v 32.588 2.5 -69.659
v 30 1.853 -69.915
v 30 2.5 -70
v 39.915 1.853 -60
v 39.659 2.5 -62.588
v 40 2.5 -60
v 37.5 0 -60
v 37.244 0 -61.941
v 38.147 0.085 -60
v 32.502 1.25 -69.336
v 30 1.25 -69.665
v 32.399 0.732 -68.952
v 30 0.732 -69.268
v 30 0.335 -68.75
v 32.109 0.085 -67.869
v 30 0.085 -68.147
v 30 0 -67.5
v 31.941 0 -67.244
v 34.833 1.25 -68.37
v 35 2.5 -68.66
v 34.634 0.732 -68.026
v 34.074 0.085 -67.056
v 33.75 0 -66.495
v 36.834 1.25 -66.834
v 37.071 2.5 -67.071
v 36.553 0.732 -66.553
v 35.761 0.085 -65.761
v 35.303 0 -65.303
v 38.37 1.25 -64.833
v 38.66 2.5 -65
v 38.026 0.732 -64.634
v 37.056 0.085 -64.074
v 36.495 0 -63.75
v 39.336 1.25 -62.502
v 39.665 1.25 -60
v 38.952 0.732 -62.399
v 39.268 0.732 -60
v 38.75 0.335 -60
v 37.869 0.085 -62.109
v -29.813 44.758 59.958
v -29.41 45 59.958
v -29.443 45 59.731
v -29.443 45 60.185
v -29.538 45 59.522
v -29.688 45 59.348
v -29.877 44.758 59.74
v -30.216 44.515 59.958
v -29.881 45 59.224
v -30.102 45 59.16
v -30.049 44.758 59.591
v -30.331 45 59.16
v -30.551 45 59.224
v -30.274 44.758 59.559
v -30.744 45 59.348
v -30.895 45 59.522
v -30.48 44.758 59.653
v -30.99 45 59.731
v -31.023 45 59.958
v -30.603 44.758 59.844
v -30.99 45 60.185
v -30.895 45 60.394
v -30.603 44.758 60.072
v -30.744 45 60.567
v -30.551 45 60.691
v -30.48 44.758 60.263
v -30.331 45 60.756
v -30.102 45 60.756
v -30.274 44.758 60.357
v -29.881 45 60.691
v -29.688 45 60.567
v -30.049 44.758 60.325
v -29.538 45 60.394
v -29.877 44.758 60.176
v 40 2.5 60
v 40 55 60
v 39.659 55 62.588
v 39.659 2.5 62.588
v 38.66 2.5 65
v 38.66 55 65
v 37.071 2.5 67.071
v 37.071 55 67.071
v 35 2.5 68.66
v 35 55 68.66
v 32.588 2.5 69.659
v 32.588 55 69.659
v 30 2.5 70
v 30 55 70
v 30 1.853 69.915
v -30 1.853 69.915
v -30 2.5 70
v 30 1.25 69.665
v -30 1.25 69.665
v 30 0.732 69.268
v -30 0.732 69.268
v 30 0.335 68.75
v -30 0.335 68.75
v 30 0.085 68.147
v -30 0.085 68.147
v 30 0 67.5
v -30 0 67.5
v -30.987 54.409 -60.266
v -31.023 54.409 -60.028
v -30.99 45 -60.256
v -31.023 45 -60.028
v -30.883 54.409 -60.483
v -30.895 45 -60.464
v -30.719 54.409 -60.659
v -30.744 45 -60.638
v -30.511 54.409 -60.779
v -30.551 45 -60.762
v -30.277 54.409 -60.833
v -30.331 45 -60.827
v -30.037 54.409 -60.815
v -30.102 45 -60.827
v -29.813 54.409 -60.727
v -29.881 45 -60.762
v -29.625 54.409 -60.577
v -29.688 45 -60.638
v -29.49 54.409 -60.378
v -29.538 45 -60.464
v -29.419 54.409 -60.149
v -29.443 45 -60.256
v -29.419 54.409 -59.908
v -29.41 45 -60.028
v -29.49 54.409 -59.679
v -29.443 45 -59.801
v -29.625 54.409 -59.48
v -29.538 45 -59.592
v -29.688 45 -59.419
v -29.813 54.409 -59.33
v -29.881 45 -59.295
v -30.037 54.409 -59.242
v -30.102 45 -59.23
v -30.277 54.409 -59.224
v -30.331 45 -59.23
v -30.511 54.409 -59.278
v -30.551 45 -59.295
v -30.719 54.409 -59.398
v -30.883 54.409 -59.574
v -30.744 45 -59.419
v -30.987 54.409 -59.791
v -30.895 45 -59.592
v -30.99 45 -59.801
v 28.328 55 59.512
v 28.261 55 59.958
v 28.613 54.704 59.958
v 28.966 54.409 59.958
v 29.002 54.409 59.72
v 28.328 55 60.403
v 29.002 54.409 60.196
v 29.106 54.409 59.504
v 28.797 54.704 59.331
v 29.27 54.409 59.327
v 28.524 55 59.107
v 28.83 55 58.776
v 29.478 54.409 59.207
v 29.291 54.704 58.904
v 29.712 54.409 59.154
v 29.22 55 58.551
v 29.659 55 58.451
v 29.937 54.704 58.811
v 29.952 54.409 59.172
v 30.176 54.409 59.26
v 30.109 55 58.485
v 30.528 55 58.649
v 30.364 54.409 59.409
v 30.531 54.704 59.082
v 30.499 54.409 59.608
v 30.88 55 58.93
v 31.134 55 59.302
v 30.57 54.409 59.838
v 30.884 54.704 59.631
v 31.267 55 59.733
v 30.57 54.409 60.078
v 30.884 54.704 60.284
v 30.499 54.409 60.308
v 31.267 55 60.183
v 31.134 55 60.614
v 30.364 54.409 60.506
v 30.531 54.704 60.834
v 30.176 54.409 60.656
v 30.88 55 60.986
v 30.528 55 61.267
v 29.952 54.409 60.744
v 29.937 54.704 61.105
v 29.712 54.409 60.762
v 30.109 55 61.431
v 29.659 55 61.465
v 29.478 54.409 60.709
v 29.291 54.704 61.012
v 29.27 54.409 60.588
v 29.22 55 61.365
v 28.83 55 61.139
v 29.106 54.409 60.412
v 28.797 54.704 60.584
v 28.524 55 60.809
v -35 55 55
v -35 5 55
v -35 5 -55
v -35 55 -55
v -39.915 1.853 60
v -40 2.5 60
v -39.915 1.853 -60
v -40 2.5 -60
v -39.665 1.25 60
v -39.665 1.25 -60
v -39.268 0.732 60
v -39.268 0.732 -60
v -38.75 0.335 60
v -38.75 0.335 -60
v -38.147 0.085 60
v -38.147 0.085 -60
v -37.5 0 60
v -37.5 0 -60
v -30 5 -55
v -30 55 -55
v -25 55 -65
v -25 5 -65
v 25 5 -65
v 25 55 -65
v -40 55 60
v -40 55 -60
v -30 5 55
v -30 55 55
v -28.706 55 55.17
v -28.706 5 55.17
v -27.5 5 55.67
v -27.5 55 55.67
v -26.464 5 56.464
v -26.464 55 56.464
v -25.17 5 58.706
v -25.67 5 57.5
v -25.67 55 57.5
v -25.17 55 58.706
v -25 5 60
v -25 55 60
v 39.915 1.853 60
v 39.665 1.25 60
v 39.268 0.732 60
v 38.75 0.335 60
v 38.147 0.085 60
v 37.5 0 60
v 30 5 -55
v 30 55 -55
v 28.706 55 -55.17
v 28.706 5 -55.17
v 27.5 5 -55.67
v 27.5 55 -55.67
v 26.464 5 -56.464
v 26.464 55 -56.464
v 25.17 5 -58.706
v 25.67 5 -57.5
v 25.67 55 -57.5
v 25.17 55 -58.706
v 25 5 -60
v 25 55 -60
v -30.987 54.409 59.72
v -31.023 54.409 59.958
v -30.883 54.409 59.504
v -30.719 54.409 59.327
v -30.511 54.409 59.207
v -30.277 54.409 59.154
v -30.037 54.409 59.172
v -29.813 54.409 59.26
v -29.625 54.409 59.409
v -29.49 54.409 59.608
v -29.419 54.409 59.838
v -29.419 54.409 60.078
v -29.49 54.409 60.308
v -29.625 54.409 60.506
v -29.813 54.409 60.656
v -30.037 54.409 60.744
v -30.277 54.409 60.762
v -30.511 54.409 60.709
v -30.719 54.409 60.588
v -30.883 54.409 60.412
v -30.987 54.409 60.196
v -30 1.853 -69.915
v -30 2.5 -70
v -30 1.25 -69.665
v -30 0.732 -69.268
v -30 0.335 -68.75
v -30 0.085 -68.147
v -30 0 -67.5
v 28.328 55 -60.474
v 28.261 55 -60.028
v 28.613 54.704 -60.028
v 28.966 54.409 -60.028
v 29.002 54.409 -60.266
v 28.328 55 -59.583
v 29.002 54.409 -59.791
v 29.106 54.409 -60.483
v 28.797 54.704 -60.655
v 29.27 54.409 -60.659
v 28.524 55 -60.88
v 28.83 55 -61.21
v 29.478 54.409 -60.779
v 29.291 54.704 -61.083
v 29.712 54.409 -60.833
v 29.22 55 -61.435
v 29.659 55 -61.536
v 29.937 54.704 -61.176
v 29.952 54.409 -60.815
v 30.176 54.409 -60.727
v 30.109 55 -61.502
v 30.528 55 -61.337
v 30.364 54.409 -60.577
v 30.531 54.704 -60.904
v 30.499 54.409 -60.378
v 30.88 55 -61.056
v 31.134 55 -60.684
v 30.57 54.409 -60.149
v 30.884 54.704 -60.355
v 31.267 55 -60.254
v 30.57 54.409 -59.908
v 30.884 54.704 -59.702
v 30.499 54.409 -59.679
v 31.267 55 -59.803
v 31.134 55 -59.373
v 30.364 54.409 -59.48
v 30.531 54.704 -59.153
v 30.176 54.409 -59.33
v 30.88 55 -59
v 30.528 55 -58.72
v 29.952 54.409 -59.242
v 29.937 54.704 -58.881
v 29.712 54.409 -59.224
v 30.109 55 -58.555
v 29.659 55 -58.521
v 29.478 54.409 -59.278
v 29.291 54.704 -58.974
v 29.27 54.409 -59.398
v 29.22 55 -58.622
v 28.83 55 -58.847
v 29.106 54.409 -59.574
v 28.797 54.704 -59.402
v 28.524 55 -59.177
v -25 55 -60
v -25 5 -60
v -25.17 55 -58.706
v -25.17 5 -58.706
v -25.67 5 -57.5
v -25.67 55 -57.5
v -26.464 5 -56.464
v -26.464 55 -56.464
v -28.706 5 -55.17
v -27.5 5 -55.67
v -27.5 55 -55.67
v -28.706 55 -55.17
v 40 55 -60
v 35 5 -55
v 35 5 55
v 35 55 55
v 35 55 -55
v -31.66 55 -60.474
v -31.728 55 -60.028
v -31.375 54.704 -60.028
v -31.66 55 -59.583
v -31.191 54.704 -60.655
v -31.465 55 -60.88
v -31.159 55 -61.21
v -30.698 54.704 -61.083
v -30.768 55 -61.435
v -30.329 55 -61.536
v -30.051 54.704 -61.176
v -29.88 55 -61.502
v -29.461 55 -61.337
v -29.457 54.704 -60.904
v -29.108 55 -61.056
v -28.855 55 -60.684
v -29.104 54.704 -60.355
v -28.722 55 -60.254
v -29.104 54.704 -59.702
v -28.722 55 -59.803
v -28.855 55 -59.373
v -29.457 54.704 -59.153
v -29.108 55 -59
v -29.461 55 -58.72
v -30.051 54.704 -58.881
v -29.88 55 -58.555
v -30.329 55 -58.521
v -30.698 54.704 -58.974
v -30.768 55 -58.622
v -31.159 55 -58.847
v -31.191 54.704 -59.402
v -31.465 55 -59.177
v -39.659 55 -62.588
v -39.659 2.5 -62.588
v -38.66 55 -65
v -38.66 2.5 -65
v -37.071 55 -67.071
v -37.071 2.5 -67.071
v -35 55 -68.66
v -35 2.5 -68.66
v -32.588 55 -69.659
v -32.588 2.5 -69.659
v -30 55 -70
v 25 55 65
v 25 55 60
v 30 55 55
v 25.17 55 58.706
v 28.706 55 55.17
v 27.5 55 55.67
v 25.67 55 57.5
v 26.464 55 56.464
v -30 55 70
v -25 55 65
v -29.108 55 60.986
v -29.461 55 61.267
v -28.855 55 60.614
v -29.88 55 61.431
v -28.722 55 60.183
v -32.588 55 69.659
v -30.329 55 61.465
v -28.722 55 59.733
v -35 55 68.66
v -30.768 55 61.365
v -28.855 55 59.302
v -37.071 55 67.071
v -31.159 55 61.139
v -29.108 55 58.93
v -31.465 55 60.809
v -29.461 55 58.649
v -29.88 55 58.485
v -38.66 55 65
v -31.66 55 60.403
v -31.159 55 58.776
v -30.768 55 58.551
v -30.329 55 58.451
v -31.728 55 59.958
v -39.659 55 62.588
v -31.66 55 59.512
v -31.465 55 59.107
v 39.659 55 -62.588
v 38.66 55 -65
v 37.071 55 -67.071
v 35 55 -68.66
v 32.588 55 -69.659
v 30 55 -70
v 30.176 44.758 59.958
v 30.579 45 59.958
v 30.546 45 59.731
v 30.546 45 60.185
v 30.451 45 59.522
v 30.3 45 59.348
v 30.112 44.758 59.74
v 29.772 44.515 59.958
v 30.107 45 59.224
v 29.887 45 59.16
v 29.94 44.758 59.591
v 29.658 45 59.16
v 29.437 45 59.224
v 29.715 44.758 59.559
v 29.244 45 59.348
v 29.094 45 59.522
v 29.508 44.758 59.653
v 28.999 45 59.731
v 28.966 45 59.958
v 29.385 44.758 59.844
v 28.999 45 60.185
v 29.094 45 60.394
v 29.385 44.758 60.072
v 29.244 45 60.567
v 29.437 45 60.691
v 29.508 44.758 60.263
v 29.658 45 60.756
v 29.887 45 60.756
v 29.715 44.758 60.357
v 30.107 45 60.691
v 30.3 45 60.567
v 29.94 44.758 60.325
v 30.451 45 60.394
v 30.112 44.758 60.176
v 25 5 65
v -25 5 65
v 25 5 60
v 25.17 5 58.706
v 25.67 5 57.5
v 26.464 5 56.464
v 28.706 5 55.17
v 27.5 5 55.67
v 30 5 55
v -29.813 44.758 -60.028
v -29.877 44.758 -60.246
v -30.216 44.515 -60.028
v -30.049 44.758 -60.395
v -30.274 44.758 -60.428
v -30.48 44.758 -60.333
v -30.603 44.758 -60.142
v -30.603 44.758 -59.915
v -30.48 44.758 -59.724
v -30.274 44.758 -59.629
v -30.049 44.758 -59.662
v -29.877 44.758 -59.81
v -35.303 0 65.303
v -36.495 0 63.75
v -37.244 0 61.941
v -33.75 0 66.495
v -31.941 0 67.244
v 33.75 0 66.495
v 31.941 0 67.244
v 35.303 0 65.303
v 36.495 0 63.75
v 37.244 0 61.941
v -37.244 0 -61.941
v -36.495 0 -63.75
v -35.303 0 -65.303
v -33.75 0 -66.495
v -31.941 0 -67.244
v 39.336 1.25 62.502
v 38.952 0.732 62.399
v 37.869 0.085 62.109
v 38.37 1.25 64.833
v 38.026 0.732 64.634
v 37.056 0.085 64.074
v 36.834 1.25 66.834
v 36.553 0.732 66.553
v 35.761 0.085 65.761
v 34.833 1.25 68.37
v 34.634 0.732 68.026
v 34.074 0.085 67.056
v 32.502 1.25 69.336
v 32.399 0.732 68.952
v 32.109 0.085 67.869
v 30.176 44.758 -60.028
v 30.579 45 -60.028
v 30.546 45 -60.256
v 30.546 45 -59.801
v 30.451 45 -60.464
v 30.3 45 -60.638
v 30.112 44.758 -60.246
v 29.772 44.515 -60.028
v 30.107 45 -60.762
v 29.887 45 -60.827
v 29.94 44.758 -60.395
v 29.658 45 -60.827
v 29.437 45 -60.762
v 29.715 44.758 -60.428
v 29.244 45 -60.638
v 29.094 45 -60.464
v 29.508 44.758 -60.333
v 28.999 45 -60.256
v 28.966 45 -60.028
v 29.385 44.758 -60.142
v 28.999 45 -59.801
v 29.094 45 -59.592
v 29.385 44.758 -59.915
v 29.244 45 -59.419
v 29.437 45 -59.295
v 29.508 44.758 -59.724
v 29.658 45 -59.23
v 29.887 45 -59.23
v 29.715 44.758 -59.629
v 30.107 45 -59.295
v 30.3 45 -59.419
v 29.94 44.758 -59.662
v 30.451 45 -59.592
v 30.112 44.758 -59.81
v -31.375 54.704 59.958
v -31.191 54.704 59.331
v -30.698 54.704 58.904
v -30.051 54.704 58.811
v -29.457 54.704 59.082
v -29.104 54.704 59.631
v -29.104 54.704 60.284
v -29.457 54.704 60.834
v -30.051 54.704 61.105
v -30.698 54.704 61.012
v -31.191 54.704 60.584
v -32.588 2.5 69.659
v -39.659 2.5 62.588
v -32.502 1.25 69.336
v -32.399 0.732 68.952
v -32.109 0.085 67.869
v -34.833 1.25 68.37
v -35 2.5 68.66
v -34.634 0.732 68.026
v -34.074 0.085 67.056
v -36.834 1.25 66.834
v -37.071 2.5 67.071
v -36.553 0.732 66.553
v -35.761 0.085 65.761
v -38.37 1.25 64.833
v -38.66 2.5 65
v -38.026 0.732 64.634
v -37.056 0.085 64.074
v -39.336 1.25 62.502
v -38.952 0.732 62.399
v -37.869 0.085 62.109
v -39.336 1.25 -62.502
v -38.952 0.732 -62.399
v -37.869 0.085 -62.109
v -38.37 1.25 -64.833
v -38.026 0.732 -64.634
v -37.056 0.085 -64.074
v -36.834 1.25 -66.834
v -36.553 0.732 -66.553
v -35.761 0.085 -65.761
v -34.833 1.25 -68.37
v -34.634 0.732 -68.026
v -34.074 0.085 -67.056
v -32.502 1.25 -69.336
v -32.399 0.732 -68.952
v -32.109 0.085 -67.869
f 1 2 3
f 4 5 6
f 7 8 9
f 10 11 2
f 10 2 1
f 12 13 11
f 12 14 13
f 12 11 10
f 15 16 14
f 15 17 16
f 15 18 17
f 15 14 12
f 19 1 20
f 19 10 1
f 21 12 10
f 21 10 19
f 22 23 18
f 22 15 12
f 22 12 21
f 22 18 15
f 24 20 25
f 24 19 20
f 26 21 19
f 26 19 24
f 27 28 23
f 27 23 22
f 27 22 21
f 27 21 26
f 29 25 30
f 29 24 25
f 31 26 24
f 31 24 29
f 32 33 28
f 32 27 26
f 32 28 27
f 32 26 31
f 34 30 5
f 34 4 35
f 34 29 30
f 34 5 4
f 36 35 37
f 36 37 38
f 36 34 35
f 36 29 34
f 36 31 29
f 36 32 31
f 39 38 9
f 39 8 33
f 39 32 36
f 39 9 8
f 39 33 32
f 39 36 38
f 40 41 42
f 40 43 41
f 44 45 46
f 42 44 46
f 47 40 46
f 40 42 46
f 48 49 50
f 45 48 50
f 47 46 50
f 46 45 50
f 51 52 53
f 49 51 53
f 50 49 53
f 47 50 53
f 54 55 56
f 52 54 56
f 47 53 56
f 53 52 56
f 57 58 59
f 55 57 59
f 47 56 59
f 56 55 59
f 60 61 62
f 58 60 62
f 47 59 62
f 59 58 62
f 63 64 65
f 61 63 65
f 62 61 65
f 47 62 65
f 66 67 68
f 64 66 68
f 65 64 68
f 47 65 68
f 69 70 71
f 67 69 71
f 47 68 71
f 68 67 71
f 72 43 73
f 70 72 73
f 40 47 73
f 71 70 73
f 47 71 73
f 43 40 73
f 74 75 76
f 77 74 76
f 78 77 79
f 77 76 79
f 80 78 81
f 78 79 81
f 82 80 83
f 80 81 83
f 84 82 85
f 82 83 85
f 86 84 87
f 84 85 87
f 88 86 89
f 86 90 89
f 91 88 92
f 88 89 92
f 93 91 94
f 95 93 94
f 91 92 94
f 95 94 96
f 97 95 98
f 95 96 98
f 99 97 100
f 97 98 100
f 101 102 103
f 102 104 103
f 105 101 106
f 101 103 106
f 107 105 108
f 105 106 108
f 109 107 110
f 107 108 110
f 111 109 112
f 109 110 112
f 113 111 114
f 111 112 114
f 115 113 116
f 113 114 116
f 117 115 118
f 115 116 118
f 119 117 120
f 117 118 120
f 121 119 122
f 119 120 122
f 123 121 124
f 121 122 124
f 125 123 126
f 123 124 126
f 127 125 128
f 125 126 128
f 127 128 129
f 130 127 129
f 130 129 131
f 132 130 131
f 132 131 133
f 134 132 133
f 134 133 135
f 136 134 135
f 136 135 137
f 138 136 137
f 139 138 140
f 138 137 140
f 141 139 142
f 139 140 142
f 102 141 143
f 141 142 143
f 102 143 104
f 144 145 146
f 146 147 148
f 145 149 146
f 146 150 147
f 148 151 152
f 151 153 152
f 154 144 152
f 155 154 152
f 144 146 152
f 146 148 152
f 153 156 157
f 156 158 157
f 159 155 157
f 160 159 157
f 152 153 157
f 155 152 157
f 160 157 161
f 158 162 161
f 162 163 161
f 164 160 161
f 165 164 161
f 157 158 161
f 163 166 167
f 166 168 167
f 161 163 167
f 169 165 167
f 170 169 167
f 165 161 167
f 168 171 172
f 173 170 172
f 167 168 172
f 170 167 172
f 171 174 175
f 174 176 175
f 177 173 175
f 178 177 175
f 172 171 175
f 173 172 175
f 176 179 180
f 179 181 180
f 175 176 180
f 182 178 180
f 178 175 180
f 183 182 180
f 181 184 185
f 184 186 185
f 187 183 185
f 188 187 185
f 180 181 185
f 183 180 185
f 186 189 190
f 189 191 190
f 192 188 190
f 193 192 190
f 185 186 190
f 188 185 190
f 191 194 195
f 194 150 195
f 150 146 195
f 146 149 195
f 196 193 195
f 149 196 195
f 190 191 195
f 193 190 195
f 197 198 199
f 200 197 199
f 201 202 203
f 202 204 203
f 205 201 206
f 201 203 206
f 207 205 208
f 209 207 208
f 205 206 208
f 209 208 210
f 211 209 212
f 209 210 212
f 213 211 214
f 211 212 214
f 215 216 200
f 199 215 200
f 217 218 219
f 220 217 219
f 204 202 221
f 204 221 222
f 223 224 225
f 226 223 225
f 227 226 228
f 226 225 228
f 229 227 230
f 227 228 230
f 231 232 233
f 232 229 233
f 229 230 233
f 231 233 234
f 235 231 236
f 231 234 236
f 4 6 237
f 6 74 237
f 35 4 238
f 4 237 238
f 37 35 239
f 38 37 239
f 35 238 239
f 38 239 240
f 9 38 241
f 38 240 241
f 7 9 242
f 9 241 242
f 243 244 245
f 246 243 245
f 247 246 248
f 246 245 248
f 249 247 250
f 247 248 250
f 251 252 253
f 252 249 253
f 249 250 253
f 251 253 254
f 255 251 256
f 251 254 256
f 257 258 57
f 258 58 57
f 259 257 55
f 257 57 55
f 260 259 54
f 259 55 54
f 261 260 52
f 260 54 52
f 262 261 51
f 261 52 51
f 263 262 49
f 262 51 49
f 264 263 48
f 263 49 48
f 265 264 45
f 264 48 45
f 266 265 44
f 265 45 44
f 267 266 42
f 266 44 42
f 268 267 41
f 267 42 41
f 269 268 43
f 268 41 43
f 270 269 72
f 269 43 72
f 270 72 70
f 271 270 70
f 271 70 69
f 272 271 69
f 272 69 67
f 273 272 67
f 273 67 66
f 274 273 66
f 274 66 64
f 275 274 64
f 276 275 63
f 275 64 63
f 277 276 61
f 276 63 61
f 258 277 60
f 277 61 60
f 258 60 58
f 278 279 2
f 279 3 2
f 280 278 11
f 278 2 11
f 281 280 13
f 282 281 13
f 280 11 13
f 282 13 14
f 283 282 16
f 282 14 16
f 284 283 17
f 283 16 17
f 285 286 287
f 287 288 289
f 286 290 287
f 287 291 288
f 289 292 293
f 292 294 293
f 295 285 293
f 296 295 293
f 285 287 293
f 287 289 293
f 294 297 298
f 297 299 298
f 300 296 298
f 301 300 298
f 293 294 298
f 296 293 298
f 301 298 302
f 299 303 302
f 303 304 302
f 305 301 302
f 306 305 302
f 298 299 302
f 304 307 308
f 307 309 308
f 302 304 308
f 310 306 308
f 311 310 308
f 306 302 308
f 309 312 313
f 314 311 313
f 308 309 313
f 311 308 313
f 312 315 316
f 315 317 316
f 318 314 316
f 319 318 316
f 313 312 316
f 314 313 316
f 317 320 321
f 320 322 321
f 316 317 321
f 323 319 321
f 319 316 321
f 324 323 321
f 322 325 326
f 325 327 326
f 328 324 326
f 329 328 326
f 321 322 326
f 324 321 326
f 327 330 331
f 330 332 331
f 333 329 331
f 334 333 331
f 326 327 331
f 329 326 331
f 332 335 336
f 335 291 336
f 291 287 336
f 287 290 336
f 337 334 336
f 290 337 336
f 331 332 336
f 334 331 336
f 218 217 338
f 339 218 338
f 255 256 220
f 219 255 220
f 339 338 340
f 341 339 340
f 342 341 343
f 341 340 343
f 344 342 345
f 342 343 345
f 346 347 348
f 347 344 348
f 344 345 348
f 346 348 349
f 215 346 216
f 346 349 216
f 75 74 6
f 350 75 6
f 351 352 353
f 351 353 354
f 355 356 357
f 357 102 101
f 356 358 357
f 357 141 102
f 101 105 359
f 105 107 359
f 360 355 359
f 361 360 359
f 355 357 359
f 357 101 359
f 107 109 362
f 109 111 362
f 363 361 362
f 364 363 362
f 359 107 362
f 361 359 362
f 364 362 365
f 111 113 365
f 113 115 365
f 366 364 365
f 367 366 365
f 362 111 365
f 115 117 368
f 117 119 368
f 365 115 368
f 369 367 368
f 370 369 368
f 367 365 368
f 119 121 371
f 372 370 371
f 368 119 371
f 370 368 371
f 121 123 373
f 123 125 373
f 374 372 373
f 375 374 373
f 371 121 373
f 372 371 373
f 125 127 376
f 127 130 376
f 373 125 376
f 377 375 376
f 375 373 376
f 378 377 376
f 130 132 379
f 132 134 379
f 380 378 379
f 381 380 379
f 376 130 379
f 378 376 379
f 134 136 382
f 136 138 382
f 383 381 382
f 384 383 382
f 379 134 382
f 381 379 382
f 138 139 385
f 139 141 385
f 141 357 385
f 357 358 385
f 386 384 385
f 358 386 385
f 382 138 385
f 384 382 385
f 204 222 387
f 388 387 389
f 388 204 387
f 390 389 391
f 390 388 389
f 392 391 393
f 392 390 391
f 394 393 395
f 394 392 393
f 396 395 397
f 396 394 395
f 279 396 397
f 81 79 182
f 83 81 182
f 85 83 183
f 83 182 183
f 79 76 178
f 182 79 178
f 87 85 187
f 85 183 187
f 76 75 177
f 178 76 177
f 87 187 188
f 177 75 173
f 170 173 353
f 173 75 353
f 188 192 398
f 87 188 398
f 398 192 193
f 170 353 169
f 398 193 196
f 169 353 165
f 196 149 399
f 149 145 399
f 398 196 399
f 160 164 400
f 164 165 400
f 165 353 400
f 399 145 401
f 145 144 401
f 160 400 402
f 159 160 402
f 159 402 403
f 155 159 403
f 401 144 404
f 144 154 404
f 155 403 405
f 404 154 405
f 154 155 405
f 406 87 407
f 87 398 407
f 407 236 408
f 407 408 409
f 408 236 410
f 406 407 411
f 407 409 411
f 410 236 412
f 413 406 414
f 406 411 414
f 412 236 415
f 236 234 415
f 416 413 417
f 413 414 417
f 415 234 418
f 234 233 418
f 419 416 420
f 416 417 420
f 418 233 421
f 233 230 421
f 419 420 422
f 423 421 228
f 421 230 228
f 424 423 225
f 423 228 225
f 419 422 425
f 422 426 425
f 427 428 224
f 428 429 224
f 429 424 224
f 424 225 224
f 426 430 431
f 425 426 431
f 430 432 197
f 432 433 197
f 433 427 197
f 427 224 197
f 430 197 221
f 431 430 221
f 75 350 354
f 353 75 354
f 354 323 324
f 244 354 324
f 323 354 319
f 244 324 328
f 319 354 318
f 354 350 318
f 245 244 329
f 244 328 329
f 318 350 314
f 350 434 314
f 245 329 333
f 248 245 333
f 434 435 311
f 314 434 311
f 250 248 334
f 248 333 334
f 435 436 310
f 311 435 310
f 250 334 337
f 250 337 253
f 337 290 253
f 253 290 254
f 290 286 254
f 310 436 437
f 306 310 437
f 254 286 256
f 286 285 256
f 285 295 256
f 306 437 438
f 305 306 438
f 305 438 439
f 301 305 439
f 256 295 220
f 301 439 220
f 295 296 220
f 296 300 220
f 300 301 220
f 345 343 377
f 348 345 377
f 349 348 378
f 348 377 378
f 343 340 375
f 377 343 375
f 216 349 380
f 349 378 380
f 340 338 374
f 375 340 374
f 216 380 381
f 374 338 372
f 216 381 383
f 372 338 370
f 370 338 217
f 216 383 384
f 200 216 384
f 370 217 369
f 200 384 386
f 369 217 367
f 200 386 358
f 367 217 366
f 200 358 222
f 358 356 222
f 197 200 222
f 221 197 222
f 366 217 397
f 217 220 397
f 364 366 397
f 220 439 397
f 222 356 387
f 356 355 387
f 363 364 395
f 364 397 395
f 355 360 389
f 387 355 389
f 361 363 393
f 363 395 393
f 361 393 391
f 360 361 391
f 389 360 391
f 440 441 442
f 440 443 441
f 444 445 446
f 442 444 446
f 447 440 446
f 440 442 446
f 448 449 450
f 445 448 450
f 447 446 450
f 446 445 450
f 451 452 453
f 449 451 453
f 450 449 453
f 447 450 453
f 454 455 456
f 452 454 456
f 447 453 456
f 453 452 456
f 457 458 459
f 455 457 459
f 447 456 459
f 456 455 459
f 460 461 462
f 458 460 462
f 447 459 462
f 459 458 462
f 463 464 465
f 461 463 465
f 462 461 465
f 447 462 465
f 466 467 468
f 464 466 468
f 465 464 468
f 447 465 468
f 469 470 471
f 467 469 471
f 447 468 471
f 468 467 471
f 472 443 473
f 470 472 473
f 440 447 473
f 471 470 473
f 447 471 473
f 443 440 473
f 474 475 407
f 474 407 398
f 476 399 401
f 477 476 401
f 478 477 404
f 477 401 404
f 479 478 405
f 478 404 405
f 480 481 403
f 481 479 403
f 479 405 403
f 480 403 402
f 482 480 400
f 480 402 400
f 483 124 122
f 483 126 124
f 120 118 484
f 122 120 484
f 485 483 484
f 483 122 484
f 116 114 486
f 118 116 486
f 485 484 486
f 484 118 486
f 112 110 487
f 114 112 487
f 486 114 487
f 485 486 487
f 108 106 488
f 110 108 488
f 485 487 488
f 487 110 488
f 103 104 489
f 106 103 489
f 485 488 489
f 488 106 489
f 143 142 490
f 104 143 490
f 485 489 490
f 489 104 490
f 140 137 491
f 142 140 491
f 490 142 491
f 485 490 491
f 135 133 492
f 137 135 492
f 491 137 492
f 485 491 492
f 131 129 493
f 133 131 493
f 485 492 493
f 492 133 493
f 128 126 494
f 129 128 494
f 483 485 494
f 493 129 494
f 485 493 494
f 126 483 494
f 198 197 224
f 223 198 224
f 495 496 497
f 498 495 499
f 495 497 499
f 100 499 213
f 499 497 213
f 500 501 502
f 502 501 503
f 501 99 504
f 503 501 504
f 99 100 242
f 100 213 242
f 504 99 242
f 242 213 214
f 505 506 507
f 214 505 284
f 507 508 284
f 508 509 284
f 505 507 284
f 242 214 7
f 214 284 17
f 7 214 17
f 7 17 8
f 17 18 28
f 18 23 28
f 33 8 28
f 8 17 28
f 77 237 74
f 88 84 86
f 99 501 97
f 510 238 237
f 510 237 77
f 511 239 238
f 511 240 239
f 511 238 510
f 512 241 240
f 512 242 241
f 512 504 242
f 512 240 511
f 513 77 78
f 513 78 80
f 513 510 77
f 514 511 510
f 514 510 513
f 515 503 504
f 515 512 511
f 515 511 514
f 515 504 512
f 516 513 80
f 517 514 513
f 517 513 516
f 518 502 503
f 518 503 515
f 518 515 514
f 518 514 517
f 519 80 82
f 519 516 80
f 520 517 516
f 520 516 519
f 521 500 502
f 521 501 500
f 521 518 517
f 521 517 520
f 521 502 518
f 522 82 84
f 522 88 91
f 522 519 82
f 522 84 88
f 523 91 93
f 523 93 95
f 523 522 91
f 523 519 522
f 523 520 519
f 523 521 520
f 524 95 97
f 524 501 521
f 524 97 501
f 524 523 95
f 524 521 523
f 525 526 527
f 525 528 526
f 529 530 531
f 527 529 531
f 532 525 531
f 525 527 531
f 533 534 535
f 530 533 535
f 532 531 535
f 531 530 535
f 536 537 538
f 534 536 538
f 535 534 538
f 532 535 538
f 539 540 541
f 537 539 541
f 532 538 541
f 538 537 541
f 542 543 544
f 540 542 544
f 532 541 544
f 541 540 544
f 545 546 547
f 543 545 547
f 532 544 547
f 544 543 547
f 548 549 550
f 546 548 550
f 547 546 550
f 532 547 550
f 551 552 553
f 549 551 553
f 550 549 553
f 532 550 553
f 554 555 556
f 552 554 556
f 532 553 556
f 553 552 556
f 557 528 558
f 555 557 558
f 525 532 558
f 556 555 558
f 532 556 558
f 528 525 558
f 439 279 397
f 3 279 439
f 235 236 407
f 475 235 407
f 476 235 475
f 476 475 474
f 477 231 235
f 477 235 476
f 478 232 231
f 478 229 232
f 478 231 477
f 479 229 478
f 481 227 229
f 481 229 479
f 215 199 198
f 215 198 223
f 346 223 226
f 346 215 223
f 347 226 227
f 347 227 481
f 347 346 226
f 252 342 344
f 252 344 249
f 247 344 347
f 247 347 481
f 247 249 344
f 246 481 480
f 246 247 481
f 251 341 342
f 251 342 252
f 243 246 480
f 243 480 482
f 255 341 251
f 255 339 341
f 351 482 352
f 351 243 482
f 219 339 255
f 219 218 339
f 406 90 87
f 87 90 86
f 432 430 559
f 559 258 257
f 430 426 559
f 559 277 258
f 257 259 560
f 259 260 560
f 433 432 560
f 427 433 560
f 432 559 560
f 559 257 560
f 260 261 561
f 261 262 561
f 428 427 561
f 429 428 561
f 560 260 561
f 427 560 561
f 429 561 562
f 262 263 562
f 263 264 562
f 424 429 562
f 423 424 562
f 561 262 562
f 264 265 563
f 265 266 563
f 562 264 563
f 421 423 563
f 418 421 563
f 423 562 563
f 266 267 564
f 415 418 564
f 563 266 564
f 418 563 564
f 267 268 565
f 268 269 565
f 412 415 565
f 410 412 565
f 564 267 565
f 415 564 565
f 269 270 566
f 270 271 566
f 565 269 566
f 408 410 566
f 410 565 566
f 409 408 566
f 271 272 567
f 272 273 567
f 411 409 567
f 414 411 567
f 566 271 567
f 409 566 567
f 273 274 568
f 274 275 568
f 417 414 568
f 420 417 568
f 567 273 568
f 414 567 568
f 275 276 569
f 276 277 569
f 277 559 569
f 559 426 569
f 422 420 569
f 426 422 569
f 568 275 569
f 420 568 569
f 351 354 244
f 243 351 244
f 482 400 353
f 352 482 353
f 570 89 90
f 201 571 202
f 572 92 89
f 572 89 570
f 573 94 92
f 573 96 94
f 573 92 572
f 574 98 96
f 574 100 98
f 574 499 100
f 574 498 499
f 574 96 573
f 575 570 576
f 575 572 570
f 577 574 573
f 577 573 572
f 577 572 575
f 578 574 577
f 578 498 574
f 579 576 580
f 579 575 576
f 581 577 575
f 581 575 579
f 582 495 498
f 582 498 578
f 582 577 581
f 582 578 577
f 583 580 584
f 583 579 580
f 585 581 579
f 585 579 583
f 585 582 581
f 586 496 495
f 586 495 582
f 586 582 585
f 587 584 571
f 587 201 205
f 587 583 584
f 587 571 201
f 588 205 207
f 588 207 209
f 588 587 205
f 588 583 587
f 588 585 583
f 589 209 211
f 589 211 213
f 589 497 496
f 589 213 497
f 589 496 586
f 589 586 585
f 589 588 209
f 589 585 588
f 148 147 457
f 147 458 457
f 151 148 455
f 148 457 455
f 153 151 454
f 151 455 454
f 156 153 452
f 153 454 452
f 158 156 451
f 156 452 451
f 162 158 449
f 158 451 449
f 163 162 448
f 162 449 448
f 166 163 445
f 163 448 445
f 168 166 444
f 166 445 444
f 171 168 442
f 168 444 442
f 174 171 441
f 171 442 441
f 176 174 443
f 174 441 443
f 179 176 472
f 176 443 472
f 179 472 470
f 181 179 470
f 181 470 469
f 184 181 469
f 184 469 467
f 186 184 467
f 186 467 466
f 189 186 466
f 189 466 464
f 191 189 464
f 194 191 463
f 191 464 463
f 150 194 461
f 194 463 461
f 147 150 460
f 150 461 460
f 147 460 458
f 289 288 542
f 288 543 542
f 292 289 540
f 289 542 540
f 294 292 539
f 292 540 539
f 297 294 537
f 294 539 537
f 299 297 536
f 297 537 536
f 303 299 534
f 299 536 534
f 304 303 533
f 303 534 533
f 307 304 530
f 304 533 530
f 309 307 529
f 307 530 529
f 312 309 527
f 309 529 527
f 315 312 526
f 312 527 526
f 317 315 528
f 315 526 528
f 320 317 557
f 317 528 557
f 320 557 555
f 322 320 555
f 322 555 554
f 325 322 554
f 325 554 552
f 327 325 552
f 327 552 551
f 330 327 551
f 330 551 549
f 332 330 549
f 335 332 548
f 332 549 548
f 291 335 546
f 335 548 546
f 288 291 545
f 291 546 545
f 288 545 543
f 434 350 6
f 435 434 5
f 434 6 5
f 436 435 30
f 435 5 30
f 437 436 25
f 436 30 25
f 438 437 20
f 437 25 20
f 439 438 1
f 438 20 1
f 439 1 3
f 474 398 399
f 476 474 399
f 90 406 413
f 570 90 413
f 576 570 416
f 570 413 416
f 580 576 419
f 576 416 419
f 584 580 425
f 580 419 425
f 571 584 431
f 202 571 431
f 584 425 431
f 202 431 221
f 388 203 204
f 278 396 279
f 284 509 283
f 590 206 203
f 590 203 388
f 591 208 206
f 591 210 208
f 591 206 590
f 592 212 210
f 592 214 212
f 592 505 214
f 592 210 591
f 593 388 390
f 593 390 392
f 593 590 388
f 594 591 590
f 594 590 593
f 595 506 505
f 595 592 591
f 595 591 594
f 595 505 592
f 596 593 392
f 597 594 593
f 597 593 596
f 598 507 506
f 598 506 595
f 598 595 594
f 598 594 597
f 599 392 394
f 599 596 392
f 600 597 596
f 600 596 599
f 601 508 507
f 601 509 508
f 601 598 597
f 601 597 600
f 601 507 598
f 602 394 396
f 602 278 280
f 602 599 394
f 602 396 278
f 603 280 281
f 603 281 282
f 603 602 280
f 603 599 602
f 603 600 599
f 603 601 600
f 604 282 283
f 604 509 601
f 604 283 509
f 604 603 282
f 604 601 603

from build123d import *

# Parameters (mm, degrees)
SKETCH2_W                                         = 80
SKETCH2_H                                         = 140
BOSS_EXTRUDE1_DEPTH                               = 50
SHELL1_T                                          = -5
SKETCH3_W                                         = 80
SKETCH3_H                                         = 140
SKETCH3_W_2                                       = 70
SKETCH3_H_2                                       = 130
BOSS_EXTRUDE2_DEPTH                               = 5
BOSS_EXTRUDE3_REACH                               = 99.596
CSK_FOR_0_FLAT_HEAD_MACHINE_SCREW_100_D           = 1.6129
CSK_FOR_0_FLAT_HEAD_MACHINE_SCREW_100_DEPTH       = 10
CSK_FOR_0_FLAT_HEAD_MACHINE_SCREW_100_CSINK_D     = 3.0226
CSK_FOR_0_FLAT_HEAD_MACHINE_SCREW_100_CSINK_ANGLE = 100
CSK_FOR_0_FLAT_HEAD_MACHINE_SCREW_100_TIP         = 0.484564046
FILLET1_R                                         = 10
FILLET2_R                                         = 2.5


with BuildPart() as part:
    # Sketch2 → Boss-Extrude1 (new body)
    with BuildSketch(Plane(origin=(0, 0, 0), x_dir=(1, 0, 0), z_dir=(0, 1, 0))):
        Rectangle(SKETCH2_W, SKETCH2_H)
    extrude(amount=BOSS_EXTRUDE1_DEPTH)

    # Shell1
    shell1_openings = [part.faces().sort_by_distance(p)[0] for p in [
        (0, 50, 0),
    ]]
    offset(amount=SHELL1_T, openings=shell1_openings, kind=Kind.INTERSECTION)

    # Sketch3 → Boss-Extrude2 (add)
    with BuildSketch(Plane(origin=(0, 50, 0), x_dir=(1, 0, 0), z_dir=(0, 1, 0))):
        Rectangle(SKETCH3_W, SKETCH3_H)
        Rectangle(SKETCH3_W_2, SKETCH3_H_2, mode=Mode.SUBTRACT)
    extrude(amount=BOSS_EXTRUDE2_DEPTH)

    # Sketch4 → Boss-Extrude3 (add, up to next)
    with BuildSketch(Plane(origin=(0, 55, 0), x_dir=(1, 0, 0), z_dir=(0, 1, 0)), mode=Mode.PRIVATE) as boss_extrude3_sk1:
        with BuildLine():
            Line((-35, -65), (-35, -55))
            Line((-35, -55), (-30, -55))
            ThreePointArc((-30, -55), (-26.464466094, -56.464466094), (-25, -60))
            Line((-25, -60), (-25, -65))
            Line((-25, -65), (-35, -65))
        make_face()
    boss_extrude3_tool1 = extrude(boss_extrude3_sk1.sketch, amount=-BOSS_EXTRUDE3_REACH, mode=Mode.PRIVATE) - part.part
    # Sketch4 → Boss-Extrude3 (add, up to next)
    with BuildSketch(Plane(origin=(0, 55, 0), x_dir=(1, 0, 0), z_dir=(0, 1, 0)), mode=Mode.PRIVATE) as boss_extrude3_sk2:
        with BuildLine():
            Line((30, -55), (35, -55))
            Line((35, -55), (35, -65))
            Line((35, -65), (25, -65))
            Line((25, -65), (25, -60))
            ThreePointArc((25, -60), (26.464466094, -56.464466094), (30, -55))
        make_face()
    boss_extrude3_tool2 = extrude(boss_extrude3_sk2.sketch, amount=-BOSS_EXTRUDE3_REACH, mode=Mode.PRIVATE) - part.part
    # Sketch4 → Boss-Extrude3 (add, up to next)
    with BuildSketch(Plane(origin=(0, 55, 0), x_dir=(1, 0, 0), z_dir=(0, 1, 0)), mode=Mode.PRIVATE) as boss_extrude3_sk3:
        with BuildLine():
            Line((25, 60), (25, 65))
            Line((25, 65), (35, 65))
            Line((35, 65), (35, 55))
            Line((35, 55), (30, 55))
            ThreePointArc((30, 55), (26.464466094, 56.464466094), (25, 60))
        make_face()
    boss_extrude3_tool3 = extrude(boss_extrude3_sk3.sketch, amount=-BOSS_EXTRUDE3_REACH, mode=Mode.PRIVATE) - part.part
    # Sketch4 → Boss-Extrude3 (add, up to next)
    with BuildSketch(Plane(origin=(0, 55, 0), x_dir=(1, 0, 0), z_dir=(0, 1, 0)), mode=Mode.PRIVATE) as boss_extrude3_sk4:
        with BuildLine():
            Line((-30, 55), (-35, 55))
            Line((-35, 55), (-35, 65))
            Line((-35, 65), (-25, 65))
            Line((-25, 65), (-25, 60))
            ThreePointArc((-25, 60), (-26.464466094, 56.464466094), (-30, 55))
        make_face()
    boss_extrude3_tool4 = extrude(boss_extrude3_sk4.sketch, amount=-BOSS_EXTRUDE3_REACH, mode=Mode.PRIVATE) - part.part
    add(boss_extrude3_tool1.solids().sort_by_distance((-30.220144, 55, 60.220144))[0])
    add(boss_extrude3_tool2.solids().sort_by_distance((30.220144, 55, 60.220144))[0])
    add(boss_extrude3_tool3.solids().sort_by_distance((30.220144, 55, -60.220144))[0])
    add(boss_extrude3_tool4.solids().sort_by_distance((-30.220144, 55, -60.220144))[0])

    # CSK for #0 Flat Head Machine Screw (100)1
    with Locations(Plane(origin=(0, 55, 0), x_dir=(1, 0, 0), z_dir=(0, 1, 0))):
        with Locations((-30.216332876, -59.957909435), (29.772350977, -59.957909435), (29.772350977, 60.028429813), (-30.216332876, 60.028429813)):
            CounterSinkHole(CSK_FOR_0_FLAT_HEAD_MACHINE_SCREW_100_D / 2, CSK_FOR_0_FLAT_HEAD_MACHINE_SCREW_100_CSINK_D / 2, depth=CSK_FOR_0_FLAT_HEAD_MACHINE_SCREW_100_DEPTH, counter_sink_angle=CSK_FOR_0_FLAT_HEAD_MACHINE_SCREW_100_CSINK_ANGLE)
            with Locations((0, 0, -(CSK_FOR_0_FLAT_HEAD_MACHINE_SCREW_100_DEPTH + CSK_FOR_0_FLAT_HEAD_MACHINE_SCREW_100_TIP / 2))):  # 118° drill point
                Cone(0, CSK_FOR_0_FLAT_HEAD_MACHINE_SCREW_100_D / 2, CSK_FOR_0_FLAT_HEAD_MACHINE_SCREW_100_TIP, mode=Mode.SUBTRACT)

    # Fillet1
    fillet1_edges = [part.edges().sort_by_distance(p)[0] for p in [
        (40, 27.5, 70),
        (-40, 27.5, 70),
        (-40, 27.5, -70),
        (40, 27.5, -70),
    ]]
    fillet(fillet1_edges, radius=FILLET1_R)

    # Fillet2
    fillet2_edges = [part.edges().sort_by_distance(p)[0] for p in [
        (-40, 0, 0),
        (40, 0, 0),
        (0, 0, 70),
        (0, 0, -70),
        (37.071067812, 0, 67.071067812),
        (-37.071067812, 0, 67.071067812),
        (37.071067812, 0, -67.071067812),
        (-37.071067812, 0, -67.071067812),
    ]]
    fillet(fillet2_edges, radius=FILLET2_R)


solid = part.part
